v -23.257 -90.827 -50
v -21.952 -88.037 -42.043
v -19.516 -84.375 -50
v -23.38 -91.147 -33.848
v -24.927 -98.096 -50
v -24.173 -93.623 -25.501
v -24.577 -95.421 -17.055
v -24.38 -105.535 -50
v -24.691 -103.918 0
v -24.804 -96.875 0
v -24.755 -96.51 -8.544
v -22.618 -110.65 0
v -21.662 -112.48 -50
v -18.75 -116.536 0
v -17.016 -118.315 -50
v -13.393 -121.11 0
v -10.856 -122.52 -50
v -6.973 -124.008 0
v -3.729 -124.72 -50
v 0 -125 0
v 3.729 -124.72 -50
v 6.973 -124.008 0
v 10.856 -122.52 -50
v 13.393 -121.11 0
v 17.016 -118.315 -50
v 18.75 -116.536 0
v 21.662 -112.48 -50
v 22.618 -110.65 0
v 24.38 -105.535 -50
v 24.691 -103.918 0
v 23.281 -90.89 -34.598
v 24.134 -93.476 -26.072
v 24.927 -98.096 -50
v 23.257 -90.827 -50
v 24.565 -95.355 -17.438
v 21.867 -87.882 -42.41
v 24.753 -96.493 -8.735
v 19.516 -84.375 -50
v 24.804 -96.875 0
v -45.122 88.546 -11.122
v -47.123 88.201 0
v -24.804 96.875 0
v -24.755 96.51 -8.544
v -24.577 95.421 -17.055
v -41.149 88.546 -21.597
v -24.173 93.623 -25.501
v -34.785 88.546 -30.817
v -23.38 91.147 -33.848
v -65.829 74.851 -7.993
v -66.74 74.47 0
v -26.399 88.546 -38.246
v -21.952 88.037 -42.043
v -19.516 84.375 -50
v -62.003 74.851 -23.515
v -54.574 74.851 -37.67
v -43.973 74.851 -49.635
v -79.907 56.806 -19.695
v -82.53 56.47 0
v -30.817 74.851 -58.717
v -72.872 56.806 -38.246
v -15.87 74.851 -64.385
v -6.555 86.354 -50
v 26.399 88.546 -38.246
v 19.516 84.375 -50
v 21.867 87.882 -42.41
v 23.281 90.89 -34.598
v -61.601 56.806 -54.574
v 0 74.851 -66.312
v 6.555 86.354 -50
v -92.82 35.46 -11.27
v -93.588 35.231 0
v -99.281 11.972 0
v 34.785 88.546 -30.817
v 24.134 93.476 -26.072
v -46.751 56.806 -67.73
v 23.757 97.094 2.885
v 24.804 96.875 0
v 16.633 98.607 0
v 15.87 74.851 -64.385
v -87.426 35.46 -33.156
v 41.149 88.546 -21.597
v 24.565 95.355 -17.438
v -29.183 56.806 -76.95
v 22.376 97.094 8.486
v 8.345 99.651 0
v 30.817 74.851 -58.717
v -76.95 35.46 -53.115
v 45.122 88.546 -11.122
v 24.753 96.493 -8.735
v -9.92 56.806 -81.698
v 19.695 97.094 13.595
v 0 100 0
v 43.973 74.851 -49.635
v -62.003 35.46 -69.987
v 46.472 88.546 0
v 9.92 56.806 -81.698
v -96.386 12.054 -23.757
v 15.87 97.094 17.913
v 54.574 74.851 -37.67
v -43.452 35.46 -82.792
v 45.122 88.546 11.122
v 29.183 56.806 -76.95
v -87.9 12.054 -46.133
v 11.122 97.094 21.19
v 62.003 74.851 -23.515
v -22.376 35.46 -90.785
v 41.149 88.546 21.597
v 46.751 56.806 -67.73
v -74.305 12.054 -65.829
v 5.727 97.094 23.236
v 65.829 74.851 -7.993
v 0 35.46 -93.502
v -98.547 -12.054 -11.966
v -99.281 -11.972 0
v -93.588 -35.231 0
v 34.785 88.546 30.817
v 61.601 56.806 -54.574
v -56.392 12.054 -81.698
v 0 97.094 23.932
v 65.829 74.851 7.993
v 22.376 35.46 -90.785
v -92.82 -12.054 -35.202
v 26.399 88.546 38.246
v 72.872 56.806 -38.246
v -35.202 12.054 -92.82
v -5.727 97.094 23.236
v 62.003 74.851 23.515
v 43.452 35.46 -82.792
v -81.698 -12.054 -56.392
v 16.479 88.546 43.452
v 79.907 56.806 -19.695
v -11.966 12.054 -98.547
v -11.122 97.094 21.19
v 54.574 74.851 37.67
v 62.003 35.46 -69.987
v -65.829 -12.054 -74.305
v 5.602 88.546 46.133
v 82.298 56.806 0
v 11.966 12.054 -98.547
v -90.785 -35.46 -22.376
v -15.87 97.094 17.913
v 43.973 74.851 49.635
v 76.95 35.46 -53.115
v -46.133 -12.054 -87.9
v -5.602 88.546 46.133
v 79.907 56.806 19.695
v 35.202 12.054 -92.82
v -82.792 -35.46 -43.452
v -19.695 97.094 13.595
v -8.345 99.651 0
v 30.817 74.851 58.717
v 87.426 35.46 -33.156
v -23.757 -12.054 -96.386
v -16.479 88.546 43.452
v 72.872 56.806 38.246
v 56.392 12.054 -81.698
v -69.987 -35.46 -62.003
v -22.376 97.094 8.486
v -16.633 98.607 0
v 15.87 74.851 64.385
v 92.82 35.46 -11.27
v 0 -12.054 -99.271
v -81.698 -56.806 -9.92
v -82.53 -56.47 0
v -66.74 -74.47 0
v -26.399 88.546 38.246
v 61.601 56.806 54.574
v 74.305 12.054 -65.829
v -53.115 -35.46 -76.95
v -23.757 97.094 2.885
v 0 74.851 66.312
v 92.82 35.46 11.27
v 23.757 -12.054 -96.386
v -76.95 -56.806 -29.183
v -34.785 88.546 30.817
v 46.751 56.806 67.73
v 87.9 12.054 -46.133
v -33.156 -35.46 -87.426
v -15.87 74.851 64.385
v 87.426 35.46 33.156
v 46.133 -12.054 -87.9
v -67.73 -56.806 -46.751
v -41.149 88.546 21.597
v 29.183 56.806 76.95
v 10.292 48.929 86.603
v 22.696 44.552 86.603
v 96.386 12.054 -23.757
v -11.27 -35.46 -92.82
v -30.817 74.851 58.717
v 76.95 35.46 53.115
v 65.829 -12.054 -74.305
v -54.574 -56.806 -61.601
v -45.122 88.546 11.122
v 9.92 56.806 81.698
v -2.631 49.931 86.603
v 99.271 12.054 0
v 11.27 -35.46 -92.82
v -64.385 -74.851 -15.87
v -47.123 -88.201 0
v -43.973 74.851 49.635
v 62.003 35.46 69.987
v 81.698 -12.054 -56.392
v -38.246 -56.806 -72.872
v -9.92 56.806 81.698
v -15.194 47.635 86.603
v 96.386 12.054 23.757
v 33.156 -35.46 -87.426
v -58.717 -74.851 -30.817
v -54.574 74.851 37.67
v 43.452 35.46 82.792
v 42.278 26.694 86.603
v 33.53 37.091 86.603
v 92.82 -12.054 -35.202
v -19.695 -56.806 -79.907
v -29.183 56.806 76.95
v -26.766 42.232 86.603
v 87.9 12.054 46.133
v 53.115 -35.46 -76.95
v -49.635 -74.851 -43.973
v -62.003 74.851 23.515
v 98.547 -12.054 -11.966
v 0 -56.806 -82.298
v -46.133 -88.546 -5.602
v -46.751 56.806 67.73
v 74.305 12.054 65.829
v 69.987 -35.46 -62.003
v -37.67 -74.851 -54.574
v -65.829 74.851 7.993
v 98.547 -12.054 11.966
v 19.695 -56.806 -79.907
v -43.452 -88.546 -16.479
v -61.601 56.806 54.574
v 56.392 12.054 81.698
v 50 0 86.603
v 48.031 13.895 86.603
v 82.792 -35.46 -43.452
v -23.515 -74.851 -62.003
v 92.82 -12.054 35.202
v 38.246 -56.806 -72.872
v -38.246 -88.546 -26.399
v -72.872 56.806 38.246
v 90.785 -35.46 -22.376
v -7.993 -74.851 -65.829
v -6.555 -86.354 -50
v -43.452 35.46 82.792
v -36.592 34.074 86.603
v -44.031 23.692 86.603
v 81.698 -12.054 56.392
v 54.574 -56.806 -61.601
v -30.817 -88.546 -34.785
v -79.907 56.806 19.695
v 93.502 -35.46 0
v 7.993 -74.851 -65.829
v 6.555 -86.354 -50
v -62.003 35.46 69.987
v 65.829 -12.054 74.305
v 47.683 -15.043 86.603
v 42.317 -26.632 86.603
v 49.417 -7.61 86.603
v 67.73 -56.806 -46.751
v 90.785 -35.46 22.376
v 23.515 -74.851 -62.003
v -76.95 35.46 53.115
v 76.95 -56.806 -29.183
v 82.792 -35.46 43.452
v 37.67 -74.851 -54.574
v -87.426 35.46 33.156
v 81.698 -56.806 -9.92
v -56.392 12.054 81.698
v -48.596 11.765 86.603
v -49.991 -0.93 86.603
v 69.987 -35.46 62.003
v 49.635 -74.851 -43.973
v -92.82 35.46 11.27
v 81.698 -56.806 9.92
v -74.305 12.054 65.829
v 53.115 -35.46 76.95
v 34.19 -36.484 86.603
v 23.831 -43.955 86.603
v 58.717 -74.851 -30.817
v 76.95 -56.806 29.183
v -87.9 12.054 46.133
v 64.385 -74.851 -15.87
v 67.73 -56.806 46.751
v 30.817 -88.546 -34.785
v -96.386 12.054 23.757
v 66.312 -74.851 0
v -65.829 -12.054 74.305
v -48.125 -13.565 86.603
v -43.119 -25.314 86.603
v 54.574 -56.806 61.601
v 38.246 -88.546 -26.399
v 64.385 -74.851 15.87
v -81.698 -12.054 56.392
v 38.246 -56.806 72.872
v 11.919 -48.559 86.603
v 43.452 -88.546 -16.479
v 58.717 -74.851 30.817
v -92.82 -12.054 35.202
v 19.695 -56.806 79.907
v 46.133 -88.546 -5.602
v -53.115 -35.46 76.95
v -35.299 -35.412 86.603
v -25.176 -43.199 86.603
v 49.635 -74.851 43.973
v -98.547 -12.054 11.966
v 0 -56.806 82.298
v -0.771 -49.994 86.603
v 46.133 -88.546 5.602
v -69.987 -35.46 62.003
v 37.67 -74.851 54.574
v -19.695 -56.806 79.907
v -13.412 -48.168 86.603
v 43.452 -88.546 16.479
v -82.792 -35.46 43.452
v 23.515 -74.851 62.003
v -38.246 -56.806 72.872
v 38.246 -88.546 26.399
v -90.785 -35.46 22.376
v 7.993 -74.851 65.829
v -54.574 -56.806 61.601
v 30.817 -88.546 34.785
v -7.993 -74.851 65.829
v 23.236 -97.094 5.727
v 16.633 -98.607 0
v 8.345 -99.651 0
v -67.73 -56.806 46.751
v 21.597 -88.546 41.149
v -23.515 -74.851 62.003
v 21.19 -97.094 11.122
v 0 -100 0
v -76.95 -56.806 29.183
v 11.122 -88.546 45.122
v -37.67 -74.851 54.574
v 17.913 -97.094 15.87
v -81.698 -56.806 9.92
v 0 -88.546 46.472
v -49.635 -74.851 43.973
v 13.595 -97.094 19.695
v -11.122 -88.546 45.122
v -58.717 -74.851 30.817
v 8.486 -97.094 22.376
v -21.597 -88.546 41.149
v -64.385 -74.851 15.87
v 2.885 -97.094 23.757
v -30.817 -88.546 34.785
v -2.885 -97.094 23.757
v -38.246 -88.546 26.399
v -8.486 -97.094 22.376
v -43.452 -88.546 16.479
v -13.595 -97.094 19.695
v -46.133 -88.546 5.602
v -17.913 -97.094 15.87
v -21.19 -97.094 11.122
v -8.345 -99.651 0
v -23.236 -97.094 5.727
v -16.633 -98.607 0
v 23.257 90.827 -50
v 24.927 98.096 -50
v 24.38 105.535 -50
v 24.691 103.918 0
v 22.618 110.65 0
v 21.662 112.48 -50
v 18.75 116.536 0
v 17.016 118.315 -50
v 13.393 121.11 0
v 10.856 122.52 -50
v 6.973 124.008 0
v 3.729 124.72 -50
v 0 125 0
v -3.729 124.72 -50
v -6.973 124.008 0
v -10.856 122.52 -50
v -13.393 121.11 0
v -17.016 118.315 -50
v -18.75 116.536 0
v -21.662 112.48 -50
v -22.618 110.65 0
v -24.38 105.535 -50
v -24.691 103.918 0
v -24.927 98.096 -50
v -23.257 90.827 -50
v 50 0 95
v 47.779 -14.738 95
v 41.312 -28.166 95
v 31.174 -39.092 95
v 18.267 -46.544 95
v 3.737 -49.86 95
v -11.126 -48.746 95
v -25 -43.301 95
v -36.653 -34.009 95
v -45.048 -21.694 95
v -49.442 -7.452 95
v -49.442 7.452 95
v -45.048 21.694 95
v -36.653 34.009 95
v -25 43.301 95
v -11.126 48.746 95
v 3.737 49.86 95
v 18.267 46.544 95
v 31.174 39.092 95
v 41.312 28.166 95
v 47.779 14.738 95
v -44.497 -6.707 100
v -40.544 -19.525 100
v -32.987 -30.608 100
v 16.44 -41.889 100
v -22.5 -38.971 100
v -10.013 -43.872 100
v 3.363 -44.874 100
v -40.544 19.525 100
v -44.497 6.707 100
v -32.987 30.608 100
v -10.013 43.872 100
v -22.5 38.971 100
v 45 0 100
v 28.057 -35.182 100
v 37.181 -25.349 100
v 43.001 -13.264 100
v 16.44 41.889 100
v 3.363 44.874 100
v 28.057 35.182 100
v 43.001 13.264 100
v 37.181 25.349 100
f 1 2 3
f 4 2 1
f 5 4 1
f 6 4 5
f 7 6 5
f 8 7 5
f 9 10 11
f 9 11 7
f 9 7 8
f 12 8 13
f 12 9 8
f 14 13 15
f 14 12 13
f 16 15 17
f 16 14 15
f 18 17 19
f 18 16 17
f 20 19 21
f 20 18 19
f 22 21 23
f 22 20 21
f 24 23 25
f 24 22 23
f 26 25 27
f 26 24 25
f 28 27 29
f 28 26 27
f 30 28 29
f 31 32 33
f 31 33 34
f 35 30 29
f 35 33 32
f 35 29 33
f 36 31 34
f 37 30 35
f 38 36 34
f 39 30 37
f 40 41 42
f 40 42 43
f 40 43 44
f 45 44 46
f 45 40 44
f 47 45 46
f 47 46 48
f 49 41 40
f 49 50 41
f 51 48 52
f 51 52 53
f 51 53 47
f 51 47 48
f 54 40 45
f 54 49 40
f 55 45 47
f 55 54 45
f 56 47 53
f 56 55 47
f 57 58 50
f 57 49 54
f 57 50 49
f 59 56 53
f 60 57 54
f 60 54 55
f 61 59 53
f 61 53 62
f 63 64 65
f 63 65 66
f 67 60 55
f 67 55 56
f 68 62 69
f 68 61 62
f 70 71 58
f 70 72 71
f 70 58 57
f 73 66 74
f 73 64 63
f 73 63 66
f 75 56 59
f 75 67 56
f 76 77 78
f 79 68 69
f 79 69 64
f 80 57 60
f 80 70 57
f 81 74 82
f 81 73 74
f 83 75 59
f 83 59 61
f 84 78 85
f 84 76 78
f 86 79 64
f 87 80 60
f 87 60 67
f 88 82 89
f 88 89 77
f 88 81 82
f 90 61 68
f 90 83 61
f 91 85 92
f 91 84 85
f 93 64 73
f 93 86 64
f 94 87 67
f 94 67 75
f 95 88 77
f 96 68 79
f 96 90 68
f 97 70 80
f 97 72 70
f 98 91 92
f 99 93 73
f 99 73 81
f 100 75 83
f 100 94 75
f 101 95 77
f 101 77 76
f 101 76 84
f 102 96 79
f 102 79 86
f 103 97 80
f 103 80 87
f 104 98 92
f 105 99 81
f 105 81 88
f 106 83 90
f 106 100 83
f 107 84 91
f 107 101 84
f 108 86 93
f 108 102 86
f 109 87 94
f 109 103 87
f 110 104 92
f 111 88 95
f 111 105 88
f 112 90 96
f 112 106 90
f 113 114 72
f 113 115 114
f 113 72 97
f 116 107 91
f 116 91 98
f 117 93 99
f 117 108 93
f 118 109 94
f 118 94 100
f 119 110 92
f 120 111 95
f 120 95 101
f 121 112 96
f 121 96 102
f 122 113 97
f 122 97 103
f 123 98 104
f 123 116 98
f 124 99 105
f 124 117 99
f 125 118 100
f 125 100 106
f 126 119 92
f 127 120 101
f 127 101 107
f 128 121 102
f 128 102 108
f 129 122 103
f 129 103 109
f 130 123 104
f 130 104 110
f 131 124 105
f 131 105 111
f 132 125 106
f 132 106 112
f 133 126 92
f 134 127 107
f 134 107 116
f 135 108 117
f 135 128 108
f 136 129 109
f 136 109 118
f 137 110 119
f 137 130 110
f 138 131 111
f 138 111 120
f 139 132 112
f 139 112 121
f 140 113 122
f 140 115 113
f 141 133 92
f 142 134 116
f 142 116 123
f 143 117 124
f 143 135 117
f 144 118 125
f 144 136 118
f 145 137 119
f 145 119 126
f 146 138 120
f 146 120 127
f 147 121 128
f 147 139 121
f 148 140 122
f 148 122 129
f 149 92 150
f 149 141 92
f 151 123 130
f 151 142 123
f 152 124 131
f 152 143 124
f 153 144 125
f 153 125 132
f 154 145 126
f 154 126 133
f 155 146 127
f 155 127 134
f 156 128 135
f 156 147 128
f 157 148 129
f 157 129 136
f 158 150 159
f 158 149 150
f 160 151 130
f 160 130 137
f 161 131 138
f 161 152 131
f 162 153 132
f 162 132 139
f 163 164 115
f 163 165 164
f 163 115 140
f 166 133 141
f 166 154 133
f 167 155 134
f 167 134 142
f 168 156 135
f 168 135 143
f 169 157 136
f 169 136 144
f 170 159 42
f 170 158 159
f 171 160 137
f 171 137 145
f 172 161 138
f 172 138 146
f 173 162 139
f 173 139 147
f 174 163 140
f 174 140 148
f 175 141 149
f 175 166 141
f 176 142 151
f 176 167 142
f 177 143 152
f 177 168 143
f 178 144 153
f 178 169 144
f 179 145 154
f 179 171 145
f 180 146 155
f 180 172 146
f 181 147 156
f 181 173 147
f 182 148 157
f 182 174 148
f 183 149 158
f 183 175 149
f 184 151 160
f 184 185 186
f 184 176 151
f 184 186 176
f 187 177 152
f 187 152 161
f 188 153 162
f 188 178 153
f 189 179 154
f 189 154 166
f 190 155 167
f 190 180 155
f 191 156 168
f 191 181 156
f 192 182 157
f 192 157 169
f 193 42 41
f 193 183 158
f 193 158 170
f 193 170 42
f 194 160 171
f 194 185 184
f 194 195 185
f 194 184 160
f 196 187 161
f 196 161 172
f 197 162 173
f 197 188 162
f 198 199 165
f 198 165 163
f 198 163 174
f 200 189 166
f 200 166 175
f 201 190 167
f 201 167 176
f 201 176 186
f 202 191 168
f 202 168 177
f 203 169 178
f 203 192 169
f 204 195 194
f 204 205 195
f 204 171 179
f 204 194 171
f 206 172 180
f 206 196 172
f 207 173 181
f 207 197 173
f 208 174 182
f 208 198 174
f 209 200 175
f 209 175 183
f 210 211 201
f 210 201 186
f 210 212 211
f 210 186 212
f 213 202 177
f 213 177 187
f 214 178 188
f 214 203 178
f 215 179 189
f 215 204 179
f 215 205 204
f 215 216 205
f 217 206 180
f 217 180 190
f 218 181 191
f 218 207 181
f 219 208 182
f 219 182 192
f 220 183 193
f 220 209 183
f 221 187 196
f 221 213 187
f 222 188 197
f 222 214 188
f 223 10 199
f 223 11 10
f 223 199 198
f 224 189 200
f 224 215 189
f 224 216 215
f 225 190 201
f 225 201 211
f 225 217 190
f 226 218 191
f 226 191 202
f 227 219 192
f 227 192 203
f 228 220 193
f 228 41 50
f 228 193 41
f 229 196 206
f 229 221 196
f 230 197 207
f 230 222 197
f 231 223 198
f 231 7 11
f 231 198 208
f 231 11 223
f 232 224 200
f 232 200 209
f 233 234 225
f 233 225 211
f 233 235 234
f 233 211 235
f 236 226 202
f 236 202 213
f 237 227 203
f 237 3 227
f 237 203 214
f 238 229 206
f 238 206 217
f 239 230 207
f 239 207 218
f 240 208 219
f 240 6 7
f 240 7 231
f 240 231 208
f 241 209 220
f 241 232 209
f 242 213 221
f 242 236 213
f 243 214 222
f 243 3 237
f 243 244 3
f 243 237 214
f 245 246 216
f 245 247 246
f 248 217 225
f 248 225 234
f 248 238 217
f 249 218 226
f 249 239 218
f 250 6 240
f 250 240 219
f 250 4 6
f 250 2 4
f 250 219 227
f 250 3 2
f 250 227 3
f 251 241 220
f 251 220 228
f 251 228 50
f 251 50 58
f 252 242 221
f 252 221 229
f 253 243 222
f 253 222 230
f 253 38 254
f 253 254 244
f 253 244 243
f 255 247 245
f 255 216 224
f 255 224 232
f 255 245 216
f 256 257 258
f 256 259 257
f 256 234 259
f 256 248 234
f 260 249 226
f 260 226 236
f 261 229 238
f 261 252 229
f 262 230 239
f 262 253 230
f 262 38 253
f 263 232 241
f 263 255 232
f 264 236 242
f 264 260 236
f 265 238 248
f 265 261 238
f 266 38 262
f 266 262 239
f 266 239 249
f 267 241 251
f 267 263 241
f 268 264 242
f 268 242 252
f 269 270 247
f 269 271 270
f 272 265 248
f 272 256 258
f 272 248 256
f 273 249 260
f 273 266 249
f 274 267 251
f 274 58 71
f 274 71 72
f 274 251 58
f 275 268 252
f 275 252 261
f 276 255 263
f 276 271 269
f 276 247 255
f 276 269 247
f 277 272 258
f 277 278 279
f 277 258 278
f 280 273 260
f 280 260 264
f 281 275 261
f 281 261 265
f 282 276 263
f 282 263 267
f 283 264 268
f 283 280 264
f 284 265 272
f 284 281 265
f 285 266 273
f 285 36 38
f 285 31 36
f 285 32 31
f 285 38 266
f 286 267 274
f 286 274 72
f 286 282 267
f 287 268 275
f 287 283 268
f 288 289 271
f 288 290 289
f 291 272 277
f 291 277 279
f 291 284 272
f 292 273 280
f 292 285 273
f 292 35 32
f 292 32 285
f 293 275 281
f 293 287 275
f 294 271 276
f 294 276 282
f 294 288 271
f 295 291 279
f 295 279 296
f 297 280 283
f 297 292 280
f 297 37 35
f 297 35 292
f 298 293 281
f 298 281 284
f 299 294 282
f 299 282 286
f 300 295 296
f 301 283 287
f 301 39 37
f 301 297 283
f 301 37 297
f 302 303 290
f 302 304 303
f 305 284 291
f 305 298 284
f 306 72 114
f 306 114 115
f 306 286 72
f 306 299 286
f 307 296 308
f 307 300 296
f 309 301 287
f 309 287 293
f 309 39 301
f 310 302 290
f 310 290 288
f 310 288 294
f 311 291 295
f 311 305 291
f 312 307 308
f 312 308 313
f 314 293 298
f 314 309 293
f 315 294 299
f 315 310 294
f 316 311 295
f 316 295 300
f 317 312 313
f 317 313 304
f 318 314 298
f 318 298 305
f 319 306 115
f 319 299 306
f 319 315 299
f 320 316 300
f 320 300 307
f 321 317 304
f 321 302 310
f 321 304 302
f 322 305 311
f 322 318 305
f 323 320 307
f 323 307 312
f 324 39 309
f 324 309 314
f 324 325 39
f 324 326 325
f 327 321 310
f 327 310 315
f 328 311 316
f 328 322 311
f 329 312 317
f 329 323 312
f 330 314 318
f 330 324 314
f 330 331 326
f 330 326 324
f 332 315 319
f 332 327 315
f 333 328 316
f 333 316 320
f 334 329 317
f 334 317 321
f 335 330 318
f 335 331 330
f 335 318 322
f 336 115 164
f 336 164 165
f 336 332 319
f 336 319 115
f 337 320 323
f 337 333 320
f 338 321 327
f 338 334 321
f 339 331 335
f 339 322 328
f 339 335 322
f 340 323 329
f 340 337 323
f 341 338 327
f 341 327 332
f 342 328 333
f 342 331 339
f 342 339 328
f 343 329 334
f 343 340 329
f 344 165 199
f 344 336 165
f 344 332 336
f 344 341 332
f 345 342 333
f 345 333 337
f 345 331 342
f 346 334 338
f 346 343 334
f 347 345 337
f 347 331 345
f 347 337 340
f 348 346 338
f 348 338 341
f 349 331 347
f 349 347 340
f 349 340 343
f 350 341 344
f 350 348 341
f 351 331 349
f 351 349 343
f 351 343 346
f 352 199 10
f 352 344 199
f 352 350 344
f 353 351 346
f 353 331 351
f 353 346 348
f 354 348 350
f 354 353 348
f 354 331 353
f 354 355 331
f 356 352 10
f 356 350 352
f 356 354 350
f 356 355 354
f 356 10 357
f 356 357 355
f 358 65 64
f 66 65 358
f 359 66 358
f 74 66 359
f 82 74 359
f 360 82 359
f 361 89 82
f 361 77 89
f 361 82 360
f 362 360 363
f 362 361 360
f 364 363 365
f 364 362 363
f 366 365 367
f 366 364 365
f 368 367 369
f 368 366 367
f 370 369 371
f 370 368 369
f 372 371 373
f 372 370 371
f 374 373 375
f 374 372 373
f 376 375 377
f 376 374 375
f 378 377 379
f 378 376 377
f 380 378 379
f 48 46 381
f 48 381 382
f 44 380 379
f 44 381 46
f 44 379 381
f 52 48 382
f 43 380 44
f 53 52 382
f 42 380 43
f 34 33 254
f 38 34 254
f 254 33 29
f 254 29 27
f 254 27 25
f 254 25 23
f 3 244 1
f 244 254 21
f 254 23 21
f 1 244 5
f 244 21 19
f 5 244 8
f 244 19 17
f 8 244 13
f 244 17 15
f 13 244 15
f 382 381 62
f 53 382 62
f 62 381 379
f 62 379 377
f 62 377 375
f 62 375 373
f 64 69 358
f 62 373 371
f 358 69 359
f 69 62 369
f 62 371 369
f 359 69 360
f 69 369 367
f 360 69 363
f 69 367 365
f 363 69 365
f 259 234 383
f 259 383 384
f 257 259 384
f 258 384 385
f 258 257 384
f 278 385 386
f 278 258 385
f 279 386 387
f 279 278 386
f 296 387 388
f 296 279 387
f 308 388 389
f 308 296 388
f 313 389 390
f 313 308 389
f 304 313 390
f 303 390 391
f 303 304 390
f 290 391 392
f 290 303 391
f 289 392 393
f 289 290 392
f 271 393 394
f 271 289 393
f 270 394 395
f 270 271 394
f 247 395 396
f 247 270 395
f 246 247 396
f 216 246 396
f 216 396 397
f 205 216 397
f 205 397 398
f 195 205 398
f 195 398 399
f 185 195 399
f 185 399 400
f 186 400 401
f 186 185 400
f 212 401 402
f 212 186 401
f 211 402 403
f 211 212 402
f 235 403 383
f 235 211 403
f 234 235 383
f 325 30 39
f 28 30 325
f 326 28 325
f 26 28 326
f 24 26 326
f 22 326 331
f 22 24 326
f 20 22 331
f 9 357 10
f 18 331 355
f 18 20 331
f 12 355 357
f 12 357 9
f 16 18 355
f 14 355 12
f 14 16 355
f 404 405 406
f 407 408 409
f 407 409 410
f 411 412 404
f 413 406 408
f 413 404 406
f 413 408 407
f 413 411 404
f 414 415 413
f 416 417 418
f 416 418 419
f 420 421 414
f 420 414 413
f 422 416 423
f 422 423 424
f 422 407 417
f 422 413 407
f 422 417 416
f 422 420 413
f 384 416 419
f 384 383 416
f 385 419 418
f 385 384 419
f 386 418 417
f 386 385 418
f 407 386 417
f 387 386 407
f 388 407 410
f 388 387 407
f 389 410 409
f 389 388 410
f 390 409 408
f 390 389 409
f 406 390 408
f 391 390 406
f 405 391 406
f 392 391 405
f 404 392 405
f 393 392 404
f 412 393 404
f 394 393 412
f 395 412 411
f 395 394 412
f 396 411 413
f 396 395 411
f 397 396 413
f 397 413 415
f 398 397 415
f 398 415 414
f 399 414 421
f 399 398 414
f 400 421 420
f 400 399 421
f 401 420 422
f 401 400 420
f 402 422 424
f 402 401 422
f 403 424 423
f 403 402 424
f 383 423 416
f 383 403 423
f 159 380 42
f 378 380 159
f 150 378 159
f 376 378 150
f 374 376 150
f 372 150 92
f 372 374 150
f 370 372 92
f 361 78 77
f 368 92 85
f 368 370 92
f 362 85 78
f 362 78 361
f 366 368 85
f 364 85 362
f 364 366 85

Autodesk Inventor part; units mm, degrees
sketch "スケッチ1" plane through (0, 0, 0) normal (0, 0, 1) x (1, 0, 0)
  arc A0 (0, 100) -> (0, -100) centre (0, 0) ccw
  line L0 (0, 100) -> (0, -100)
  dimension "d0" = 200
revolve "回転1" add sketch "スケッチ1" angle 360 about axis through (0, 100, 0) along (0, -1, 0)
ref_plane "作業平面1" through (0, 0, 200) normal (0, 0, 1) x (1, 0, 0)
ref_plane "作業平面2" through (0, 100, 0) normal (0, 1, 0) x (-1, 0, 0)
ref_plane "作業平面3" through (0, -100, 0) normal (0, 1, 0) x (-1, 0, 0)
ref_plane "作業平面4" through (0, 0, -100) normal (0, 0, 1) x (1, 0, 0)
sketch "スケッチ2" plane through (0, 0, 0) normal (0, 0, 1) x (1, 0, 0)
  circle A0 centre (0, 0) radius 50
  dimension "d6" = 100
extrude "押し出し1" add sketch "スケッチ2" along normal blind 100
chamfer "面取り1" distance 5 angle 45 1 edges at (-50, 0, 100)
sketch "スケッチ3" plane through (0, 0, 0) normal (0, 0, 1) x (1, 0, 0)
  circle A0 centre (0, 100) radius 25
  point P0 (0, 0)
  dimension "d12" = 50
  dimension "d13" = 100
extrude "押し出し2" add sketch "スケッチ3" against normal blind 50
mirror "ミラー1" about plane through (0, 0, 0) normal (0, 1, 0) of "押し出し2"
properties part number "Hips"
